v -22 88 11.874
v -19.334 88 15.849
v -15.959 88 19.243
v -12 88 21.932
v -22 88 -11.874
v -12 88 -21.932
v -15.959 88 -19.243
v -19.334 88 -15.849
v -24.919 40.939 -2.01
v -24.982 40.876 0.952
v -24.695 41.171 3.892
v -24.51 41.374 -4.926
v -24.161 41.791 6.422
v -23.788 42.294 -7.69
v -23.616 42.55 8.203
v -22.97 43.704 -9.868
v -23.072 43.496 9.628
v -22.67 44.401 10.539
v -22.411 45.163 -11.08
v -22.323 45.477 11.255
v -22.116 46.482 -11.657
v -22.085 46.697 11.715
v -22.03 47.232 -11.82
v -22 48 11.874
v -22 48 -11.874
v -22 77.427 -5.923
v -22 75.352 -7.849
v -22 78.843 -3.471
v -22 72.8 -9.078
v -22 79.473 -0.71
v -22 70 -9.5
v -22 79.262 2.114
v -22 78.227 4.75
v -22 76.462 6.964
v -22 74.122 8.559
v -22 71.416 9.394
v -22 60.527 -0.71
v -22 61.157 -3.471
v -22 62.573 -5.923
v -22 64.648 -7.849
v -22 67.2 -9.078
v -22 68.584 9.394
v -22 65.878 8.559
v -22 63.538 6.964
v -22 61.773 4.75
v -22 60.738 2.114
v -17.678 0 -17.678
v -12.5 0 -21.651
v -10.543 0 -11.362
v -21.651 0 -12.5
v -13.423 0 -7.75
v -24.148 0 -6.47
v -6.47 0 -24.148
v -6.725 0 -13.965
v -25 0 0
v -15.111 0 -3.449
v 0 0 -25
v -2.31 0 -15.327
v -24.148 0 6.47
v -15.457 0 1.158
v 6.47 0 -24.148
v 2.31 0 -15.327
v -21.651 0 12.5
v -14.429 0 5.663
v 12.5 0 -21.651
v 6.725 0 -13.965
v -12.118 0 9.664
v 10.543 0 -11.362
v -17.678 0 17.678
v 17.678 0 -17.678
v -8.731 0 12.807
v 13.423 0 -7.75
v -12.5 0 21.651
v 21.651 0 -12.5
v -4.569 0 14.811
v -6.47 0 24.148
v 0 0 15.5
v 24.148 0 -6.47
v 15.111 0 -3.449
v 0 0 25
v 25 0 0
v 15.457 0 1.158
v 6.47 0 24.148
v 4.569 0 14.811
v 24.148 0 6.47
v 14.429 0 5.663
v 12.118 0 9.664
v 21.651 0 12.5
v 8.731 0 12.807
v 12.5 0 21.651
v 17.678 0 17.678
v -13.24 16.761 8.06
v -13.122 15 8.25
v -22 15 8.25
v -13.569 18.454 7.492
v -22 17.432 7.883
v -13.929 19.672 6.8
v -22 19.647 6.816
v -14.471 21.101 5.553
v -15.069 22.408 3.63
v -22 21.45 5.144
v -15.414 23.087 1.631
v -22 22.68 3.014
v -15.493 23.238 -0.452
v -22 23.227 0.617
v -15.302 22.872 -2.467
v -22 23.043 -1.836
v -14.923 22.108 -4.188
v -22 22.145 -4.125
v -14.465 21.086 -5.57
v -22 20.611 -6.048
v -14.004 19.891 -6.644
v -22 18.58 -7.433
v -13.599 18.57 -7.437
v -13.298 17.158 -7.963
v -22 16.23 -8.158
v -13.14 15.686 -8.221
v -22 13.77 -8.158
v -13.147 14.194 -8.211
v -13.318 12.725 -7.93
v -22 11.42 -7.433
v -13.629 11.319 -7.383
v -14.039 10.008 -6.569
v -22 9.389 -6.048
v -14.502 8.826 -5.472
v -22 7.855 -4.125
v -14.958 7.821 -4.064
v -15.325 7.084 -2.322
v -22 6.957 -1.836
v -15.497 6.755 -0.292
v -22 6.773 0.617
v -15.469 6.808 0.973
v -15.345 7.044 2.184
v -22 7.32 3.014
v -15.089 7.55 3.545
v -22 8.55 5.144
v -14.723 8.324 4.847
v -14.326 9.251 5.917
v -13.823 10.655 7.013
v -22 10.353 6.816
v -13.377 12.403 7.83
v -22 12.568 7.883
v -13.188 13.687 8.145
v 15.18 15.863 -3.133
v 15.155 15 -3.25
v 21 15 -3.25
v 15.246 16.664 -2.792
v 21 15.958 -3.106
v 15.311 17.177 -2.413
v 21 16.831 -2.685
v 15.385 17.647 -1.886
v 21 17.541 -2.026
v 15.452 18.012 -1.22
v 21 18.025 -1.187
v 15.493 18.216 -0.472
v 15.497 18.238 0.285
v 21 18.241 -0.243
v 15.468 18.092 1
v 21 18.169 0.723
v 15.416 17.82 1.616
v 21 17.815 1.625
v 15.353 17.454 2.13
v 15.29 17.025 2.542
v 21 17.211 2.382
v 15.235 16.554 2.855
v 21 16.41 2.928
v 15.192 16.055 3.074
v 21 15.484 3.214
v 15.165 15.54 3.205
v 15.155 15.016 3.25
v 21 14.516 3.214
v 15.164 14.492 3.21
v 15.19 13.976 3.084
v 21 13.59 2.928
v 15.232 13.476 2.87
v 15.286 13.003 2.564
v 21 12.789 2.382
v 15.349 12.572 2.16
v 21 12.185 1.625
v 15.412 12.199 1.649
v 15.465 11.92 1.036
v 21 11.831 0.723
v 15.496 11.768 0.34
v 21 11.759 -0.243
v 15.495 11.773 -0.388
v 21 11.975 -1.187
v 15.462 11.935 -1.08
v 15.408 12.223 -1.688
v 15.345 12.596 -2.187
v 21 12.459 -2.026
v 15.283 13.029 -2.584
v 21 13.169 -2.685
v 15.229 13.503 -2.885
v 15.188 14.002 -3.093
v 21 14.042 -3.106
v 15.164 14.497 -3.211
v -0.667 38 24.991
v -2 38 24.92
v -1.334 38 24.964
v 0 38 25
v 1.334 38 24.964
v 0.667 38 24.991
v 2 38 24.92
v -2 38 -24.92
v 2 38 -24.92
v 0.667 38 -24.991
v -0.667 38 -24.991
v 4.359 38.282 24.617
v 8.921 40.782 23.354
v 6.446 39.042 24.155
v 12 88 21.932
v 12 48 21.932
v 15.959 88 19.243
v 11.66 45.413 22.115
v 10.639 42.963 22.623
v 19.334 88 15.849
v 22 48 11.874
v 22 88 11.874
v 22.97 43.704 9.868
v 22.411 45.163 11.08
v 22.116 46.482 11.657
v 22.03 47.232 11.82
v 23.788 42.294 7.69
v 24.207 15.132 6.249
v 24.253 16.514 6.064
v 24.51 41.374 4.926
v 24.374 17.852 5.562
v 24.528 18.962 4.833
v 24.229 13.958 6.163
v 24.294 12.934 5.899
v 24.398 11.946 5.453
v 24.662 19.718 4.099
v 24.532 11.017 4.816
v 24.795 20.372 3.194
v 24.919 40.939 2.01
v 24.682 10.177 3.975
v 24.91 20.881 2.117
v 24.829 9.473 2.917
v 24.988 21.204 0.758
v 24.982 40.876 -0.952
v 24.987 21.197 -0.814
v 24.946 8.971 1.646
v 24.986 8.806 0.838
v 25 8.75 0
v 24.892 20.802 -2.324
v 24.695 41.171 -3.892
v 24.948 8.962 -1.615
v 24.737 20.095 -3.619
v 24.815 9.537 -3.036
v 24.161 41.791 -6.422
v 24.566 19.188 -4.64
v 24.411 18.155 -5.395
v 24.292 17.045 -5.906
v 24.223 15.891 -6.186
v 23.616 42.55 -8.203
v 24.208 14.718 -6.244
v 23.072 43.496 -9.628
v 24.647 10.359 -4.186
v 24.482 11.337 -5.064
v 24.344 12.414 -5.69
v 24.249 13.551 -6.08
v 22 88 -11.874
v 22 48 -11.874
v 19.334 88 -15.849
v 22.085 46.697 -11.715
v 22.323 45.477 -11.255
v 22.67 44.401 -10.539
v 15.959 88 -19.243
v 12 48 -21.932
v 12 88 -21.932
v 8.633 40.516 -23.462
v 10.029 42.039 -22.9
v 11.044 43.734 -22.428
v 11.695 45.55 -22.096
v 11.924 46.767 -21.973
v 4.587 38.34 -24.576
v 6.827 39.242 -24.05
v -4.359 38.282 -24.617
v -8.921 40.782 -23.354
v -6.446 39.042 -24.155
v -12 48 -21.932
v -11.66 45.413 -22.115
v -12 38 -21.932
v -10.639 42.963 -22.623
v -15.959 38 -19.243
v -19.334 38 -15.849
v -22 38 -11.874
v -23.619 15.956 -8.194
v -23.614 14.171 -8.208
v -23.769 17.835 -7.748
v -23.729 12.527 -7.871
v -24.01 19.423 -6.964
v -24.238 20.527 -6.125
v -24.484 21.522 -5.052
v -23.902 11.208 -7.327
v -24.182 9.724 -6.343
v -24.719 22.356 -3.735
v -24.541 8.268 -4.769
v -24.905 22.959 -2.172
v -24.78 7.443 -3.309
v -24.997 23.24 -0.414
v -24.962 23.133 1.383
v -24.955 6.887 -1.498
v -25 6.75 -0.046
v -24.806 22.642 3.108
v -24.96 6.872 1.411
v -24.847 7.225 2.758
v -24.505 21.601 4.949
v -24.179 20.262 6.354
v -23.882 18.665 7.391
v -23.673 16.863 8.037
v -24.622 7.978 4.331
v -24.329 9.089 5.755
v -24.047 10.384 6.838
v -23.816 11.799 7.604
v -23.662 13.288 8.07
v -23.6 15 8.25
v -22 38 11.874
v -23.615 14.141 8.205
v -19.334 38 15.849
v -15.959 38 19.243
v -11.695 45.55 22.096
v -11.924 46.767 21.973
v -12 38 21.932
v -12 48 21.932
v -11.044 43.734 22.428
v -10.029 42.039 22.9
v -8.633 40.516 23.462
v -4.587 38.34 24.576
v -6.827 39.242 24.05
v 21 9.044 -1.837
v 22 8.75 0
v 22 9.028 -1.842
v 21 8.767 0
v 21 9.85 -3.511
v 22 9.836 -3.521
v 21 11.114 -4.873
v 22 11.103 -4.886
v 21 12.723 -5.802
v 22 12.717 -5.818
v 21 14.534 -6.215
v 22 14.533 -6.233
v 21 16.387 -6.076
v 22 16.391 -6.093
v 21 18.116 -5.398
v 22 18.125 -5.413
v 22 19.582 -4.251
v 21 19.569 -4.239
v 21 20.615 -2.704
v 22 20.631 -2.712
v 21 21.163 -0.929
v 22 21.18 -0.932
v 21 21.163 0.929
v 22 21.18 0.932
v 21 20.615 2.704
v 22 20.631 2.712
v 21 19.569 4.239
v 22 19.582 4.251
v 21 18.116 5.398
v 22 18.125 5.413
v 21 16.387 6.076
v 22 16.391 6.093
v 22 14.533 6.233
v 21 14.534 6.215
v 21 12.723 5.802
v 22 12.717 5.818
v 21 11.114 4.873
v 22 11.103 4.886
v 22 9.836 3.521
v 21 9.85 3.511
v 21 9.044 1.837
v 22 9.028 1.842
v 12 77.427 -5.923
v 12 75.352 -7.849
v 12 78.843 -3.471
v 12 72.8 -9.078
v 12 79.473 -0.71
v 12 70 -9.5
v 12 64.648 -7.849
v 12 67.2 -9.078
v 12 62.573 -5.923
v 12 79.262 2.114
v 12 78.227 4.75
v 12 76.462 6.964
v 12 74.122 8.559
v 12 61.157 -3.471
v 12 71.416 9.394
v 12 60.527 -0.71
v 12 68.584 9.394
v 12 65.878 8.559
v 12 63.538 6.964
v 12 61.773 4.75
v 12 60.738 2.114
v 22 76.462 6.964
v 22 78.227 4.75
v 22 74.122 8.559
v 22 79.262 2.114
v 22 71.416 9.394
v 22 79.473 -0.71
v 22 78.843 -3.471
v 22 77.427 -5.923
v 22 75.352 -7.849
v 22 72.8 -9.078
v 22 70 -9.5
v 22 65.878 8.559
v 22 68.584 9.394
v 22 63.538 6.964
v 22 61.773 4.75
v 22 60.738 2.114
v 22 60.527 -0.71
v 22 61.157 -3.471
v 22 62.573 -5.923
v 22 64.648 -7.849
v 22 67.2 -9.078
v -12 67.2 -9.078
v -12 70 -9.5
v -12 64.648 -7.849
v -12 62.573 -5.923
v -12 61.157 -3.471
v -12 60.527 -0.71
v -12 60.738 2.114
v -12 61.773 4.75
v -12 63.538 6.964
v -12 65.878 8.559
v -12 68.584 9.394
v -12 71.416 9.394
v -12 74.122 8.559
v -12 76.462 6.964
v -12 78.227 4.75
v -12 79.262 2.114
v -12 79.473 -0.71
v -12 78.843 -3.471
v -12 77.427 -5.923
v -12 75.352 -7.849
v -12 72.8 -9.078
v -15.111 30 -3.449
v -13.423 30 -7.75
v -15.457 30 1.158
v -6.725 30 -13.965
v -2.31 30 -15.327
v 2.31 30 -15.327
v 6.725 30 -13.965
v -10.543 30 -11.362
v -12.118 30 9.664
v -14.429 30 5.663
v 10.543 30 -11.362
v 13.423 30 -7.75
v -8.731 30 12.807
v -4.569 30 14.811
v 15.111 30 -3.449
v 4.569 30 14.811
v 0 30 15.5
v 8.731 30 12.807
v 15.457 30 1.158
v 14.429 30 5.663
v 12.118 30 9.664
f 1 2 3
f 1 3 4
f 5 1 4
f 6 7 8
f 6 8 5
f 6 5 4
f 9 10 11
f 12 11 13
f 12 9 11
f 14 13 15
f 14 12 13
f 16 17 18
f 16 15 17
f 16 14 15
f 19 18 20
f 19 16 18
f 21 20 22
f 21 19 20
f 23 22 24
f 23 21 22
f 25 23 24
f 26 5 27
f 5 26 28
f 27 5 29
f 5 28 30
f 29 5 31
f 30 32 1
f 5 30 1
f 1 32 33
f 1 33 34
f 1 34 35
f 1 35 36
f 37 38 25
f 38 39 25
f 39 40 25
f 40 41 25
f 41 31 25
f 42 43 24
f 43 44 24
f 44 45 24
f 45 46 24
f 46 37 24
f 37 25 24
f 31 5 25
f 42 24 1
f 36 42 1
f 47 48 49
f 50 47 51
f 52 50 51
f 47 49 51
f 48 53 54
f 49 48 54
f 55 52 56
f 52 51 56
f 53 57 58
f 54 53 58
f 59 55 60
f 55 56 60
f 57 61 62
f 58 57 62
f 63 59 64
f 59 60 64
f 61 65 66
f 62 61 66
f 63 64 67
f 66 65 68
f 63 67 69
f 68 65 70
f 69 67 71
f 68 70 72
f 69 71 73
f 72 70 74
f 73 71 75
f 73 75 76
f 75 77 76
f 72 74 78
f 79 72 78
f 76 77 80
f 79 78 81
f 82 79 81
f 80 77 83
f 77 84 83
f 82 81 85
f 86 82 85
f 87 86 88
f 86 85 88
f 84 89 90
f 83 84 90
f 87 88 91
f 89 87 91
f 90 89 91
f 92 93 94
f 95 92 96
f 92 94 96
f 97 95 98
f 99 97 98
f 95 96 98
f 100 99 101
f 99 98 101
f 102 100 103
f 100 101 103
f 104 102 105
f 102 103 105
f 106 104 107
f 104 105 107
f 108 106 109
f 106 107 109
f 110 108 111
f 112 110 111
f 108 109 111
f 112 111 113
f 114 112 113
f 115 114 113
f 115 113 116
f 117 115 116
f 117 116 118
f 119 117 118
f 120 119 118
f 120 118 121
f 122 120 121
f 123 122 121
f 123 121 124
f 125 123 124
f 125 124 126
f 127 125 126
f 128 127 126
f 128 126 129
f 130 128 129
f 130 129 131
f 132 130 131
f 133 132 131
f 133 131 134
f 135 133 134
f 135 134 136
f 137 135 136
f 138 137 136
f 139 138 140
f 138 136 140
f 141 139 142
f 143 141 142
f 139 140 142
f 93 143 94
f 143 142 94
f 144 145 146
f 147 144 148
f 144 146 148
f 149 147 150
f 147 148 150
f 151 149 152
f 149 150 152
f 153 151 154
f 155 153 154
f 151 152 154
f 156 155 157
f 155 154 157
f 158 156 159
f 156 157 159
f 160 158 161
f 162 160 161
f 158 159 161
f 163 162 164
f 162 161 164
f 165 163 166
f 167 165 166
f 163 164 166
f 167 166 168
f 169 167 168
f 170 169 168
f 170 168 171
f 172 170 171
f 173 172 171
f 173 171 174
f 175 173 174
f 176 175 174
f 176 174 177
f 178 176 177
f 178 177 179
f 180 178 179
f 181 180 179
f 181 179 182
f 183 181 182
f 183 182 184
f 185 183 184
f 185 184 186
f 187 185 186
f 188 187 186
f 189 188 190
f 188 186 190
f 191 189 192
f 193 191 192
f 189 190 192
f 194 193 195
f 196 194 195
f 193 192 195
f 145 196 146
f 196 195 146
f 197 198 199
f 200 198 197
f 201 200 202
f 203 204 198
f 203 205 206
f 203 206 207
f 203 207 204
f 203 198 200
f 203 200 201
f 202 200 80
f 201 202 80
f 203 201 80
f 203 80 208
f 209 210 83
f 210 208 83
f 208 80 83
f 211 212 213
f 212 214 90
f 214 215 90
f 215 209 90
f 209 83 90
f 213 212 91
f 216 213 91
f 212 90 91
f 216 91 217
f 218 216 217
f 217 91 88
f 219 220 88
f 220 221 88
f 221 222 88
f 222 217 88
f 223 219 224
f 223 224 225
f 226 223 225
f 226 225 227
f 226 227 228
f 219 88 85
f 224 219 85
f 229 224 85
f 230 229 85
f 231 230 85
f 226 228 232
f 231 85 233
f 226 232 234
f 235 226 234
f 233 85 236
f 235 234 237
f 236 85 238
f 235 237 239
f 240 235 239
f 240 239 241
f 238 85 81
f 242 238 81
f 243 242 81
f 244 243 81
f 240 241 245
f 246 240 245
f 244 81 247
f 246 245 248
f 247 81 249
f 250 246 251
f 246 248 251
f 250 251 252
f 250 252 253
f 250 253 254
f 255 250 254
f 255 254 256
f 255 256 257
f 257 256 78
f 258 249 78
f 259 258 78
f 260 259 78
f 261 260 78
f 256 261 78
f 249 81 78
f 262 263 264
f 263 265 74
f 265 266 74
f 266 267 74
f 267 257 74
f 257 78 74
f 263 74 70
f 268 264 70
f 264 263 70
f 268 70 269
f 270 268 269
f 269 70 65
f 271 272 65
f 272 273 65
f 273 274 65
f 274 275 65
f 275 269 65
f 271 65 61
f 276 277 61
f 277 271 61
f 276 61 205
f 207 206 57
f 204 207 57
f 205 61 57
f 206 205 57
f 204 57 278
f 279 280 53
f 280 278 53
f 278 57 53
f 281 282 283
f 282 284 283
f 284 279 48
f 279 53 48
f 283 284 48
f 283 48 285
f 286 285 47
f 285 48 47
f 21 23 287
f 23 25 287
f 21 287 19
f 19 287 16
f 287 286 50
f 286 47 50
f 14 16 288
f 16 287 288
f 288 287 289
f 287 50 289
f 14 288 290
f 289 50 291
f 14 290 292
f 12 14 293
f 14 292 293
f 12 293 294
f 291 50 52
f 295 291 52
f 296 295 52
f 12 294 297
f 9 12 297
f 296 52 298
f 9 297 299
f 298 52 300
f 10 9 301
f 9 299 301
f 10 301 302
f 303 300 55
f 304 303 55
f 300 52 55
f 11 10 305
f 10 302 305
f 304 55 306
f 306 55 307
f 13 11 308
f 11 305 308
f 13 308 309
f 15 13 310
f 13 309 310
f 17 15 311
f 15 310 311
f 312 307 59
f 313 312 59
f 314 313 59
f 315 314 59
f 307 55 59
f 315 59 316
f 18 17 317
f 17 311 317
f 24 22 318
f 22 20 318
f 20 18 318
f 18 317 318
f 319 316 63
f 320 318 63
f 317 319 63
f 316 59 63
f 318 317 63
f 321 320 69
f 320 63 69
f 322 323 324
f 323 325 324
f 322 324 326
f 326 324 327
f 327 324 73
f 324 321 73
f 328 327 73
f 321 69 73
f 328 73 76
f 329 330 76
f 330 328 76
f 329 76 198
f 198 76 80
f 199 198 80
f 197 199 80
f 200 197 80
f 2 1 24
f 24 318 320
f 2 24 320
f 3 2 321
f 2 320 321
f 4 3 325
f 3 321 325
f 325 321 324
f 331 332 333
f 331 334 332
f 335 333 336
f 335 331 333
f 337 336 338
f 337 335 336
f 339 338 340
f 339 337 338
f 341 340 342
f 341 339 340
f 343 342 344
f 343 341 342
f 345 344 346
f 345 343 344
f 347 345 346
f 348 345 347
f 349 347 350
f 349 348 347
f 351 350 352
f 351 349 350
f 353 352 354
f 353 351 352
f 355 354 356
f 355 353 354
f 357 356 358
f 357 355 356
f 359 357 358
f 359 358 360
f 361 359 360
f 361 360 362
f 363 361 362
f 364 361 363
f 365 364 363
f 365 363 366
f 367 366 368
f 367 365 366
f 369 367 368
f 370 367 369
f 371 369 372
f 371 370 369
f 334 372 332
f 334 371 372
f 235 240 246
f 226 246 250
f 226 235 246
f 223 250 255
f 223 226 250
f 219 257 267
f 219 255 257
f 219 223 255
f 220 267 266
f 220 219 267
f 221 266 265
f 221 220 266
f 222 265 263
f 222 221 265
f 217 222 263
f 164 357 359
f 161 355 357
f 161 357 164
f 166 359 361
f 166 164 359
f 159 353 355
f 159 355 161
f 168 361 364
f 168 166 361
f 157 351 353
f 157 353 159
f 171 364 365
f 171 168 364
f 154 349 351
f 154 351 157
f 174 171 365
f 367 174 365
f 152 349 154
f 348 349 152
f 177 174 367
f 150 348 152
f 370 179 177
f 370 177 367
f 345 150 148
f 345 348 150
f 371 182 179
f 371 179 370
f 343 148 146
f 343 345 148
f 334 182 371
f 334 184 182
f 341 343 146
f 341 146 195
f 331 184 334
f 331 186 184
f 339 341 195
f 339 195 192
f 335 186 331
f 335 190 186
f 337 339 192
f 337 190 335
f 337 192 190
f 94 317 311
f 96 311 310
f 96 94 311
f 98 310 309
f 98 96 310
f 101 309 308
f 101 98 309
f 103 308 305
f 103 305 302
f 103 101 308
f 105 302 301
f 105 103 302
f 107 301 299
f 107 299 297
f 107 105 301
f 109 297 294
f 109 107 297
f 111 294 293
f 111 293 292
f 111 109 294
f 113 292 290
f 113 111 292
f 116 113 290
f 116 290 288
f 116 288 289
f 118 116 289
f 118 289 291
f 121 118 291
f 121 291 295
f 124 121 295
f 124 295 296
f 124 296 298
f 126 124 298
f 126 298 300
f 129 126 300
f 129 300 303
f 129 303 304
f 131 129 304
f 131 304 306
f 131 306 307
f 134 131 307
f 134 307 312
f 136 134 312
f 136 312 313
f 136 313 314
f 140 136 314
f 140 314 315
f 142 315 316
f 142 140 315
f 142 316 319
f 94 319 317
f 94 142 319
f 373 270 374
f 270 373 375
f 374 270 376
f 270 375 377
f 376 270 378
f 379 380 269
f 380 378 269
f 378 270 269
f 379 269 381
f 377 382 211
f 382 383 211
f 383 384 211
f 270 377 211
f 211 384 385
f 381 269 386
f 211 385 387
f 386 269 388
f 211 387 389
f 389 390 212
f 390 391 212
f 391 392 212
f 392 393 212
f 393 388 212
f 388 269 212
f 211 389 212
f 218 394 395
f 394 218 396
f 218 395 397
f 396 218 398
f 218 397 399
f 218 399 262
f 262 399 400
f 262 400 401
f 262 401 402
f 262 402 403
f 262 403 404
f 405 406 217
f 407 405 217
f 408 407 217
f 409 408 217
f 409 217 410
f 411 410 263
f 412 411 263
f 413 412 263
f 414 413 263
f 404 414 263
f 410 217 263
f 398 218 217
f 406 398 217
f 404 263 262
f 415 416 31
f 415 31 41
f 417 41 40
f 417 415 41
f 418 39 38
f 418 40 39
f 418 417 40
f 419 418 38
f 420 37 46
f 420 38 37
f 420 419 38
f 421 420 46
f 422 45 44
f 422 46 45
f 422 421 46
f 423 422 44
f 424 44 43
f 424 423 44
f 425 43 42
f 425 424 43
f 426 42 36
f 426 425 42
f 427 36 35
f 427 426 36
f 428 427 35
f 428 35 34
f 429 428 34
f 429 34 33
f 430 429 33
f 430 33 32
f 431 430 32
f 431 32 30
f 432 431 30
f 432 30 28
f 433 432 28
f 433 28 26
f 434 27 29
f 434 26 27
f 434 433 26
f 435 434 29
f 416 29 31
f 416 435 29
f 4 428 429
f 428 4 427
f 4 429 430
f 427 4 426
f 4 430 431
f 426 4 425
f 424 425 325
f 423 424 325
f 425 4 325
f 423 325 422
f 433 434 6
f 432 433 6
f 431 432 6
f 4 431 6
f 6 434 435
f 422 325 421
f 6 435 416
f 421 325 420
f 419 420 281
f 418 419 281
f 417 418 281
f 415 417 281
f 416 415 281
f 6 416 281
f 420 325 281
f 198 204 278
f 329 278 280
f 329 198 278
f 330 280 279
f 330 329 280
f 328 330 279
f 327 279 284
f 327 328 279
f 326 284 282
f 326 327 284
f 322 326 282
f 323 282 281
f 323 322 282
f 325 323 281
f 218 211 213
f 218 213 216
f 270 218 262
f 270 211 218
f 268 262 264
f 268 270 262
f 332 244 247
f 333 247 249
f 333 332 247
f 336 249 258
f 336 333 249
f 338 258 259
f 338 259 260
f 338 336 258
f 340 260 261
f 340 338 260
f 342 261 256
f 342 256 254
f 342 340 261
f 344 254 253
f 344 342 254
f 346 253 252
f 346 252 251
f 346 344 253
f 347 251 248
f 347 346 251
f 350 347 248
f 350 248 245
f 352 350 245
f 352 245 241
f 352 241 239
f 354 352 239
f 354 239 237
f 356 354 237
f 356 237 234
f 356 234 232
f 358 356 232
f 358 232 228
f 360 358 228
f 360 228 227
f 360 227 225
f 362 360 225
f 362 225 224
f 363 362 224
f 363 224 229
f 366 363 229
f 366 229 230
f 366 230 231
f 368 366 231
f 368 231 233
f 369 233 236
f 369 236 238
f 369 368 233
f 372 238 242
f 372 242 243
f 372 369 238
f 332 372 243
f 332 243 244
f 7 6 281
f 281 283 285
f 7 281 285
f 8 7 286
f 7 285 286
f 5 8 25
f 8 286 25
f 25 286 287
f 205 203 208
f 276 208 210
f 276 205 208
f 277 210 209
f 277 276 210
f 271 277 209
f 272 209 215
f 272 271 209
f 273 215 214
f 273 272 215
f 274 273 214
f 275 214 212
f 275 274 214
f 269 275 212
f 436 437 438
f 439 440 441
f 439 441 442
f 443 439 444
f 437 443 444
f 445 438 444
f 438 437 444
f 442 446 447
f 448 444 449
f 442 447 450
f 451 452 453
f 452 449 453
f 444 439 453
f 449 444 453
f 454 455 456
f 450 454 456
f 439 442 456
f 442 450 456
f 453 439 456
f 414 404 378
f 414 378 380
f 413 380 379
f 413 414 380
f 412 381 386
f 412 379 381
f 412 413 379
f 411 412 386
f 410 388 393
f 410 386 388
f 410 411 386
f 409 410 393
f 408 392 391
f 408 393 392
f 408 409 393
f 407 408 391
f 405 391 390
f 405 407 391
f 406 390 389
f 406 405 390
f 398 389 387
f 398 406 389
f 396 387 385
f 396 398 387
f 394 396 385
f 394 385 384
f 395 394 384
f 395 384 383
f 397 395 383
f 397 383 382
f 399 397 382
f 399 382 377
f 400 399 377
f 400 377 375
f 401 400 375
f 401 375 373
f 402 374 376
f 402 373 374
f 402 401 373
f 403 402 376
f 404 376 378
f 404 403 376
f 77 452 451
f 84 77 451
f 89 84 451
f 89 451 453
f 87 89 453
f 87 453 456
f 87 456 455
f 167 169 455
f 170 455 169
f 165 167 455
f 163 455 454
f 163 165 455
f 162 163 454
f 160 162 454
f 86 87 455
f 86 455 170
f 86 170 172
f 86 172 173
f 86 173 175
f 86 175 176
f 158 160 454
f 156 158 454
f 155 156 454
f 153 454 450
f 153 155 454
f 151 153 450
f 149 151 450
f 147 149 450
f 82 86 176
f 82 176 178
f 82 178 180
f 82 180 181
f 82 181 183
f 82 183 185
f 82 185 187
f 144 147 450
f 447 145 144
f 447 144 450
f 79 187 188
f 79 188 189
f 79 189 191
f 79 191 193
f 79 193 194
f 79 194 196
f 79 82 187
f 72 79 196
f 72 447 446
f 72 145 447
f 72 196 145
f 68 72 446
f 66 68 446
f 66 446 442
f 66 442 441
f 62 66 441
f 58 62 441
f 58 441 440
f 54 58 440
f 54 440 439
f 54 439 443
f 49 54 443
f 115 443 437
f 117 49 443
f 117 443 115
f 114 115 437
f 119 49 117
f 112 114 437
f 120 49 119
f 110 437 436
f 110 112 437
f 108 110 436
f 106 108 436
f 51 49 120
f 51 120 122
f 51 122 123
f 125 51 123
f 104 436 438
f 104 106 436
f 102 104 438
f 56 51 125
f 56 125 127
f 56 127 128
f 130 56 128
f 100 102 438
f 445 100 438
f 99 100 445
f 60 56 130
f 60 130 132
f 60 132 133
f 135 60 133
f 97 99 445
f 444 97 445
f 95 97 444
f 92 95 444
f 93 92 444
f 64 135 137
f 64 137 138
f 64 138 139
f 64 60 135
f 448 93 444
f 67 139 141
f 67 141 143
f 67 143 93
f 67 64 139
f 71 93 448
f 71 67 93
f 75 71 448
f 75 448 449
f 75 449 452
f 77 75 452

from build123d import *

# Parameters (mm, degrees)
SKETCH1_R                           = 25
SKETCH1_R_2                         = 15.5
BOSS_EXTRUDE1_DEPTH                 = 30
SKETCH3_R                           = 25
BOSS_EXTRUDE2_DEPTH                 = 8
BOSS_EXTRUDE3_DEPTH                 = 50
CUT_EXTRUDE1_DEPTH                  = 103.849404471
CUT_EXTRUDE1_DEPTH_BACK             = 103.849404471
SKETCH6_R                           = 9.5
FILLET2_R                           = 10
CUT_EXTRUDE2_REACH                  = 104.849
CUT_EXTRUDE2_END_RADIUS             = 25
SKETCH7_R                           = 8.25
CUT_EXTRUDE2_DIRECTION_2_REACH      = 104.849
CUT_EXTRUDE2_DIRECTION_2_END_RADIUS = 15.5
SKETCH8_R                           = 6.25
CUT_EXTRUDE3_DEPTH                  = 103.849404626
CUT_EXTRUDE3_OTHER_WAY_DEPTH        = 1
CUT_EXTRUDE3_OTHER_WAY_TAPER        = 1
CUT_EXTRUDE4_REACH                  = 104.396
CUT_EXTRUDE4_END_RADIUS             = 15.5
SKETCH9_R                           = 3.25


with BuildPart() as part:
    # Sketch1 → Boss-Extrude1 (new body)
    with BuildSketch(Plane(origin=(0, 0, 0), x_dir=(1, 0, 0), z_dir=(0, 1, 0))):
        with Locations(Location((0, 0, 0), (0, 0, 270))):
            Circle(SKETCH1_R)
        with Locations(Location((0, 0, 0), (0, 0, 270))):
            Circle(SKETCH1_R_2, mode=Mode.SUBTRACT)
    extrude(amount=BOSS_EXTRUDE1_DEPTH)

    # Sketch3 → Boss-Extrude2 (add)
    with BuildSketch(Plane(origin=(0, 30, 0), x_dir=(1, 0, 0), z_dir=(0, 1, 0))):
        with Locations(Location((0, 0, 0), (0, 0, 270))):
            Circle(SKETCH3_R)
    extrude(amount=BOSS_EXTRUDE2_DEPTH)

    # Sketch4 → Boss-Extrude3 (add)
    with BuildSketch(Plane(origin=(0, 38, 0), x_dir=(1, 0, 0), z_dir=(0, 1, 0))):
        with BuildLine():
            Line((-12, -21.931712199), (-12, 21.931712199))
            ThreePointArc((-12, 21.931712199), (-17.728160463, 17.627033971), (-22, 11.874342087))
            Line((-22, 11.874342087), (-22, -11.874342087))
            ThreePointArc((-22, -11.874342087), (-17.728160463, -17.627033971), (-12, -21.931712199))
        make_face()
        with BuildLine():
            ThreePointArc((22, 11.874342087), (17.728160463, 17.627033971), (12, 21.931712199))
            Line((12, 21.931712199), (12, -21.931712199))
            ThreePointArc((12, -21.931712199), (17.728160463, -17.627033971), (22, -11.874342087))
            Line((22, -11.874342087), (22, 11.874342087))
        make_face()
    extrude(amount=BOSS_EXTRUDE3_DEPTH)

    # Sketch6 → Cut-Extrude1 (cut, two sides: drawn at the far end of the back side and taken through both)
    with BuildSketch(Plane.ZY.offset(22).offset(-CUT_EXTRUDE1_DEPTH_BACK)):
        with Locations(Location((0, 70, 0), (0, 0, 180))):
            Circle(SKETCH6_R)
    extrude(amount=CUT_EXTRUDE1_DEPTH + CUT_EXTRUDE1_DEPTH_BACK, mode=Mode.SUBTRACT)

    # Fillet2
    # the kernel refuses this fillet: 10 mm, written as the material it adds along each edge
    with BuildSketch(Plane(origin=(-22, 38, -36.874342087), x_dir=(-1, 0, 0), z_dir=(0, 0, 1))) as fillet2_piece_1_section:
        with BuildLine():
            CenterArc((FILLET2_R, -FILLET2_R), FILLET2_R, 90, 90)
            Line((0, -FILLET2_R), (0, 0))
            Line((0, 0), (FILLET2_R, 0))
        make_face()
    fillet2_piece_1 = extrude(amount=73.748684174, mode=Mode.PRIVATE)
    fillet2_piece_1 = fillet2_piece_1 & Plane(origin=(0, 41.226834709, 0), x_dir=(0, 0, 1), z_dir=(0, -1, 0)) * Cylinder(25, 188, mode=Mode.PRIVATE)
    add(fillet2_piece_1)
    with BuildSketch(Plane(origin=(-12, 38, 46.931712199), x_dir=(1, 0, 0), z_dir=(0, 0, -1))) as fillet2_piece_2_section:
        with BuildLine():
            CenterArc((FILLET2_R, -FILLET2_R), FILLET2_R, 90, 90)
            Line((0, -FILLET2_R), (0, 0))
            Line((0, 0), (FILLET2_R, 0))
        make_face()
    fillet2_piece_2 = extrude(amount=93.863424399, mode=Mode.PRIVATE)
    fillet2_piece_2 = fillet2_piece_2 & Plane(origin=(0, 40.21683264, 0), x_dir=(0, 0, 1), z_dir=(0, -1, 0)) * Cylinder(25, 228, mode=Mode.PRIVATE)
    add(fillet2_piece_2)
    with BuildSketch(Plane(origin=(12, 38, -46.931712199), x_dir=(-1, 0, 0), z_dir=(0, 0, 1))) as fillet2_piece_3_section:
        with BuildLine():
            CenterArc((FILLET2_R, -FILLET2_R), FILLET2_R, 90, 90)
            Line((0, -FILLET2_R), (0, 0))
            Line((0, 0), (FILLET2_R, 0))
        make_face()
    fillet2_piece_3 = extrude(amount=93.863424399, mode=Mode.PRIVATE)
    fillet2_piece_3 = fillet2_piece_3 & Plane(origin=(0, 40.21683264, 0), x_dir=(0, 0, 1), z_dir=(0, -1, 0)) * Cylinder(25, 228, mode=Mode.PRIVATE)
    add(fillet2_piece_3)
    with BuildSketch(Plane(origin=(22, 38, 36.874342087), x_dir=(0, 1, 0), z_dir=(0, 0, -1))) as fillet2_piece_4_section:
        with BuildLine():
            CenterArc((FILLET2_R, FILLET2_R), FILLET2_R, 180, 90)
            Line((0, FILLET2_R), (0, 0))
            Line((0, 0), (FILLET2_R, 0))
        make_face()
    fillet2_piece_4 = extrude(amount=73.748684174, mode=Mode.PRIVATE)
    fillet2_piece_4 = fillet2_piece_4 & Plane(origin=(0, 41.226834878, 0), x_dir=(0, 0, 1), z_dir=(0, -1, 0)) * Cylinder(25, 188, mode=Mode.PRIVATE)
    add(fillet2_piece_4)

    # Cut-Extrude2: up to this cylinder (the profile starts inside it)
    cut_extrude2_end = Plane(origin=(0, 15, 0), z_dir=(0, -1, 0)) * Cylinder(CUT_EXTRUDE2_END_RADIUS, 260.698, mode=Mode.PRIVATE)
    # Sketch7 → Cut-Extrude2 (cut, up to the surface)
    with BuildSketch(Plane.ZY.offset(22), mode=Mode.PRIVATE) as cut_extrude2_sk1:
        with Locations((0, 15)):
            Circle(SKETCH7_R)
    cut_extrude2_tool1 = extrude(cut_extrude2_sk1.sketch, amount=CUT_EXTRUDE2_REACH, mode=Mode.PRIVATE) & cut_extrude2_end
    add(cut_extrude2_tool1.solids().sort_by_distance((-22, 15, 0))[0], mode=Mode.SUBTRACT)

    # Cut-Extrude2 direction 2: up to this cylinder (the profile starts outside it)
    cut_extrude2_direction_2_end = Plane(origin=(0, 15, 0), z_dir=(0, -1, 0)) * Cylinder(CUT_EXTRUDE2_DIRECTION_2_END_RADIUS, 241.698, mode=Mode.PRIVATE)
    # Sketch7 → Cut-Extrude2 direction 2 (cut, up to the surface)
    with BuildSketch(Plane.ZY.offset(22), mode=Mode.PRIVATE) as cut_extrude2_direction_2_sk1:
        with Locations((0, 15)):
            Circle(SKETCH7_R)
    cut_extrude2_direction_2_tool1 = extrude(cut_extrude2_direction_2_sk1.sketch, amount=-CUT_EXTRUDE2_DIRECTION_2_REACH, mode=Mode.PRIVATE) - cut_extrude2_direction_2_end
    add(cut_extrude2_direction_2_tool1.solids().sort_by_distance((-22, 15, 0))[0], mode=Mode.SUBTRACT)

    # Sketch8 → Cut-Extrude3 (cut)
    with BuildSketch(Plane(origin=(22, 0, 0), x_dir=(0, 0, -1), z_dir=(1, 0, 0))):
        with Locations(Location((0, 15, 0), (0, 0, 270))):
            Circle(SKETCH8_R)
    extrude(amount=CUT_EXTRUDE3_DEPTH, mode=Mode.SUBTRACT)

    # Sketch8 → Cut-Extrude3 other way (cut)
    with BuildSketch(Plane(origin=(22, 0, 0), x_dir=(0, 0, -1), z_dir=(1, 0, 0))):
        with Locations(Location((0, 15, 0), (0, 0, 270))):
            Circle(SKETCH8_R)
    extrude(amount=-CUT_EXTRUDE3_OTHER_WAY_DEPTH, taper=CUT_EXTRUDE3_OTHER_WAY_TAPER, mode=Mode.SUBTRACT)

    # Cut-Extrude4: up to this cylinder (the profile starts outside it)
    cut_extrude4_end = Plane(origin=(0, 15, 0), z_dir=(0, -1, 0)) * Cylinder(CUT_EXTRUDE4_END_RADIUS, 240.792, mode=Mode.PRIVATE)
    # Sketch9 → Cut-Extrude4 (cut, up to the surface)
    with BuildSketch(Plane(origin=(21, 0, 0), x_dir=(0, 0, -1), z_dir=(1, 0, 0)), mode=Mode.PRIVATE) as cut_extrude4_sk1:
        with Locations((0, 15)):
            Circle(SKETCH9_R)
    cut_extrude4_tool1 = extrude(cut_extrude4_sk1.sketch, amount=-CUT_EXTRUDE4_REACH, mode=Mode.PRIVATE) - cut_extrude4_end
    add(cut_extrude4_tool1.solids().sort_by_distance((21, 15, 0))[0], mode=Mode.SUBTRACT)


solid = part.part
